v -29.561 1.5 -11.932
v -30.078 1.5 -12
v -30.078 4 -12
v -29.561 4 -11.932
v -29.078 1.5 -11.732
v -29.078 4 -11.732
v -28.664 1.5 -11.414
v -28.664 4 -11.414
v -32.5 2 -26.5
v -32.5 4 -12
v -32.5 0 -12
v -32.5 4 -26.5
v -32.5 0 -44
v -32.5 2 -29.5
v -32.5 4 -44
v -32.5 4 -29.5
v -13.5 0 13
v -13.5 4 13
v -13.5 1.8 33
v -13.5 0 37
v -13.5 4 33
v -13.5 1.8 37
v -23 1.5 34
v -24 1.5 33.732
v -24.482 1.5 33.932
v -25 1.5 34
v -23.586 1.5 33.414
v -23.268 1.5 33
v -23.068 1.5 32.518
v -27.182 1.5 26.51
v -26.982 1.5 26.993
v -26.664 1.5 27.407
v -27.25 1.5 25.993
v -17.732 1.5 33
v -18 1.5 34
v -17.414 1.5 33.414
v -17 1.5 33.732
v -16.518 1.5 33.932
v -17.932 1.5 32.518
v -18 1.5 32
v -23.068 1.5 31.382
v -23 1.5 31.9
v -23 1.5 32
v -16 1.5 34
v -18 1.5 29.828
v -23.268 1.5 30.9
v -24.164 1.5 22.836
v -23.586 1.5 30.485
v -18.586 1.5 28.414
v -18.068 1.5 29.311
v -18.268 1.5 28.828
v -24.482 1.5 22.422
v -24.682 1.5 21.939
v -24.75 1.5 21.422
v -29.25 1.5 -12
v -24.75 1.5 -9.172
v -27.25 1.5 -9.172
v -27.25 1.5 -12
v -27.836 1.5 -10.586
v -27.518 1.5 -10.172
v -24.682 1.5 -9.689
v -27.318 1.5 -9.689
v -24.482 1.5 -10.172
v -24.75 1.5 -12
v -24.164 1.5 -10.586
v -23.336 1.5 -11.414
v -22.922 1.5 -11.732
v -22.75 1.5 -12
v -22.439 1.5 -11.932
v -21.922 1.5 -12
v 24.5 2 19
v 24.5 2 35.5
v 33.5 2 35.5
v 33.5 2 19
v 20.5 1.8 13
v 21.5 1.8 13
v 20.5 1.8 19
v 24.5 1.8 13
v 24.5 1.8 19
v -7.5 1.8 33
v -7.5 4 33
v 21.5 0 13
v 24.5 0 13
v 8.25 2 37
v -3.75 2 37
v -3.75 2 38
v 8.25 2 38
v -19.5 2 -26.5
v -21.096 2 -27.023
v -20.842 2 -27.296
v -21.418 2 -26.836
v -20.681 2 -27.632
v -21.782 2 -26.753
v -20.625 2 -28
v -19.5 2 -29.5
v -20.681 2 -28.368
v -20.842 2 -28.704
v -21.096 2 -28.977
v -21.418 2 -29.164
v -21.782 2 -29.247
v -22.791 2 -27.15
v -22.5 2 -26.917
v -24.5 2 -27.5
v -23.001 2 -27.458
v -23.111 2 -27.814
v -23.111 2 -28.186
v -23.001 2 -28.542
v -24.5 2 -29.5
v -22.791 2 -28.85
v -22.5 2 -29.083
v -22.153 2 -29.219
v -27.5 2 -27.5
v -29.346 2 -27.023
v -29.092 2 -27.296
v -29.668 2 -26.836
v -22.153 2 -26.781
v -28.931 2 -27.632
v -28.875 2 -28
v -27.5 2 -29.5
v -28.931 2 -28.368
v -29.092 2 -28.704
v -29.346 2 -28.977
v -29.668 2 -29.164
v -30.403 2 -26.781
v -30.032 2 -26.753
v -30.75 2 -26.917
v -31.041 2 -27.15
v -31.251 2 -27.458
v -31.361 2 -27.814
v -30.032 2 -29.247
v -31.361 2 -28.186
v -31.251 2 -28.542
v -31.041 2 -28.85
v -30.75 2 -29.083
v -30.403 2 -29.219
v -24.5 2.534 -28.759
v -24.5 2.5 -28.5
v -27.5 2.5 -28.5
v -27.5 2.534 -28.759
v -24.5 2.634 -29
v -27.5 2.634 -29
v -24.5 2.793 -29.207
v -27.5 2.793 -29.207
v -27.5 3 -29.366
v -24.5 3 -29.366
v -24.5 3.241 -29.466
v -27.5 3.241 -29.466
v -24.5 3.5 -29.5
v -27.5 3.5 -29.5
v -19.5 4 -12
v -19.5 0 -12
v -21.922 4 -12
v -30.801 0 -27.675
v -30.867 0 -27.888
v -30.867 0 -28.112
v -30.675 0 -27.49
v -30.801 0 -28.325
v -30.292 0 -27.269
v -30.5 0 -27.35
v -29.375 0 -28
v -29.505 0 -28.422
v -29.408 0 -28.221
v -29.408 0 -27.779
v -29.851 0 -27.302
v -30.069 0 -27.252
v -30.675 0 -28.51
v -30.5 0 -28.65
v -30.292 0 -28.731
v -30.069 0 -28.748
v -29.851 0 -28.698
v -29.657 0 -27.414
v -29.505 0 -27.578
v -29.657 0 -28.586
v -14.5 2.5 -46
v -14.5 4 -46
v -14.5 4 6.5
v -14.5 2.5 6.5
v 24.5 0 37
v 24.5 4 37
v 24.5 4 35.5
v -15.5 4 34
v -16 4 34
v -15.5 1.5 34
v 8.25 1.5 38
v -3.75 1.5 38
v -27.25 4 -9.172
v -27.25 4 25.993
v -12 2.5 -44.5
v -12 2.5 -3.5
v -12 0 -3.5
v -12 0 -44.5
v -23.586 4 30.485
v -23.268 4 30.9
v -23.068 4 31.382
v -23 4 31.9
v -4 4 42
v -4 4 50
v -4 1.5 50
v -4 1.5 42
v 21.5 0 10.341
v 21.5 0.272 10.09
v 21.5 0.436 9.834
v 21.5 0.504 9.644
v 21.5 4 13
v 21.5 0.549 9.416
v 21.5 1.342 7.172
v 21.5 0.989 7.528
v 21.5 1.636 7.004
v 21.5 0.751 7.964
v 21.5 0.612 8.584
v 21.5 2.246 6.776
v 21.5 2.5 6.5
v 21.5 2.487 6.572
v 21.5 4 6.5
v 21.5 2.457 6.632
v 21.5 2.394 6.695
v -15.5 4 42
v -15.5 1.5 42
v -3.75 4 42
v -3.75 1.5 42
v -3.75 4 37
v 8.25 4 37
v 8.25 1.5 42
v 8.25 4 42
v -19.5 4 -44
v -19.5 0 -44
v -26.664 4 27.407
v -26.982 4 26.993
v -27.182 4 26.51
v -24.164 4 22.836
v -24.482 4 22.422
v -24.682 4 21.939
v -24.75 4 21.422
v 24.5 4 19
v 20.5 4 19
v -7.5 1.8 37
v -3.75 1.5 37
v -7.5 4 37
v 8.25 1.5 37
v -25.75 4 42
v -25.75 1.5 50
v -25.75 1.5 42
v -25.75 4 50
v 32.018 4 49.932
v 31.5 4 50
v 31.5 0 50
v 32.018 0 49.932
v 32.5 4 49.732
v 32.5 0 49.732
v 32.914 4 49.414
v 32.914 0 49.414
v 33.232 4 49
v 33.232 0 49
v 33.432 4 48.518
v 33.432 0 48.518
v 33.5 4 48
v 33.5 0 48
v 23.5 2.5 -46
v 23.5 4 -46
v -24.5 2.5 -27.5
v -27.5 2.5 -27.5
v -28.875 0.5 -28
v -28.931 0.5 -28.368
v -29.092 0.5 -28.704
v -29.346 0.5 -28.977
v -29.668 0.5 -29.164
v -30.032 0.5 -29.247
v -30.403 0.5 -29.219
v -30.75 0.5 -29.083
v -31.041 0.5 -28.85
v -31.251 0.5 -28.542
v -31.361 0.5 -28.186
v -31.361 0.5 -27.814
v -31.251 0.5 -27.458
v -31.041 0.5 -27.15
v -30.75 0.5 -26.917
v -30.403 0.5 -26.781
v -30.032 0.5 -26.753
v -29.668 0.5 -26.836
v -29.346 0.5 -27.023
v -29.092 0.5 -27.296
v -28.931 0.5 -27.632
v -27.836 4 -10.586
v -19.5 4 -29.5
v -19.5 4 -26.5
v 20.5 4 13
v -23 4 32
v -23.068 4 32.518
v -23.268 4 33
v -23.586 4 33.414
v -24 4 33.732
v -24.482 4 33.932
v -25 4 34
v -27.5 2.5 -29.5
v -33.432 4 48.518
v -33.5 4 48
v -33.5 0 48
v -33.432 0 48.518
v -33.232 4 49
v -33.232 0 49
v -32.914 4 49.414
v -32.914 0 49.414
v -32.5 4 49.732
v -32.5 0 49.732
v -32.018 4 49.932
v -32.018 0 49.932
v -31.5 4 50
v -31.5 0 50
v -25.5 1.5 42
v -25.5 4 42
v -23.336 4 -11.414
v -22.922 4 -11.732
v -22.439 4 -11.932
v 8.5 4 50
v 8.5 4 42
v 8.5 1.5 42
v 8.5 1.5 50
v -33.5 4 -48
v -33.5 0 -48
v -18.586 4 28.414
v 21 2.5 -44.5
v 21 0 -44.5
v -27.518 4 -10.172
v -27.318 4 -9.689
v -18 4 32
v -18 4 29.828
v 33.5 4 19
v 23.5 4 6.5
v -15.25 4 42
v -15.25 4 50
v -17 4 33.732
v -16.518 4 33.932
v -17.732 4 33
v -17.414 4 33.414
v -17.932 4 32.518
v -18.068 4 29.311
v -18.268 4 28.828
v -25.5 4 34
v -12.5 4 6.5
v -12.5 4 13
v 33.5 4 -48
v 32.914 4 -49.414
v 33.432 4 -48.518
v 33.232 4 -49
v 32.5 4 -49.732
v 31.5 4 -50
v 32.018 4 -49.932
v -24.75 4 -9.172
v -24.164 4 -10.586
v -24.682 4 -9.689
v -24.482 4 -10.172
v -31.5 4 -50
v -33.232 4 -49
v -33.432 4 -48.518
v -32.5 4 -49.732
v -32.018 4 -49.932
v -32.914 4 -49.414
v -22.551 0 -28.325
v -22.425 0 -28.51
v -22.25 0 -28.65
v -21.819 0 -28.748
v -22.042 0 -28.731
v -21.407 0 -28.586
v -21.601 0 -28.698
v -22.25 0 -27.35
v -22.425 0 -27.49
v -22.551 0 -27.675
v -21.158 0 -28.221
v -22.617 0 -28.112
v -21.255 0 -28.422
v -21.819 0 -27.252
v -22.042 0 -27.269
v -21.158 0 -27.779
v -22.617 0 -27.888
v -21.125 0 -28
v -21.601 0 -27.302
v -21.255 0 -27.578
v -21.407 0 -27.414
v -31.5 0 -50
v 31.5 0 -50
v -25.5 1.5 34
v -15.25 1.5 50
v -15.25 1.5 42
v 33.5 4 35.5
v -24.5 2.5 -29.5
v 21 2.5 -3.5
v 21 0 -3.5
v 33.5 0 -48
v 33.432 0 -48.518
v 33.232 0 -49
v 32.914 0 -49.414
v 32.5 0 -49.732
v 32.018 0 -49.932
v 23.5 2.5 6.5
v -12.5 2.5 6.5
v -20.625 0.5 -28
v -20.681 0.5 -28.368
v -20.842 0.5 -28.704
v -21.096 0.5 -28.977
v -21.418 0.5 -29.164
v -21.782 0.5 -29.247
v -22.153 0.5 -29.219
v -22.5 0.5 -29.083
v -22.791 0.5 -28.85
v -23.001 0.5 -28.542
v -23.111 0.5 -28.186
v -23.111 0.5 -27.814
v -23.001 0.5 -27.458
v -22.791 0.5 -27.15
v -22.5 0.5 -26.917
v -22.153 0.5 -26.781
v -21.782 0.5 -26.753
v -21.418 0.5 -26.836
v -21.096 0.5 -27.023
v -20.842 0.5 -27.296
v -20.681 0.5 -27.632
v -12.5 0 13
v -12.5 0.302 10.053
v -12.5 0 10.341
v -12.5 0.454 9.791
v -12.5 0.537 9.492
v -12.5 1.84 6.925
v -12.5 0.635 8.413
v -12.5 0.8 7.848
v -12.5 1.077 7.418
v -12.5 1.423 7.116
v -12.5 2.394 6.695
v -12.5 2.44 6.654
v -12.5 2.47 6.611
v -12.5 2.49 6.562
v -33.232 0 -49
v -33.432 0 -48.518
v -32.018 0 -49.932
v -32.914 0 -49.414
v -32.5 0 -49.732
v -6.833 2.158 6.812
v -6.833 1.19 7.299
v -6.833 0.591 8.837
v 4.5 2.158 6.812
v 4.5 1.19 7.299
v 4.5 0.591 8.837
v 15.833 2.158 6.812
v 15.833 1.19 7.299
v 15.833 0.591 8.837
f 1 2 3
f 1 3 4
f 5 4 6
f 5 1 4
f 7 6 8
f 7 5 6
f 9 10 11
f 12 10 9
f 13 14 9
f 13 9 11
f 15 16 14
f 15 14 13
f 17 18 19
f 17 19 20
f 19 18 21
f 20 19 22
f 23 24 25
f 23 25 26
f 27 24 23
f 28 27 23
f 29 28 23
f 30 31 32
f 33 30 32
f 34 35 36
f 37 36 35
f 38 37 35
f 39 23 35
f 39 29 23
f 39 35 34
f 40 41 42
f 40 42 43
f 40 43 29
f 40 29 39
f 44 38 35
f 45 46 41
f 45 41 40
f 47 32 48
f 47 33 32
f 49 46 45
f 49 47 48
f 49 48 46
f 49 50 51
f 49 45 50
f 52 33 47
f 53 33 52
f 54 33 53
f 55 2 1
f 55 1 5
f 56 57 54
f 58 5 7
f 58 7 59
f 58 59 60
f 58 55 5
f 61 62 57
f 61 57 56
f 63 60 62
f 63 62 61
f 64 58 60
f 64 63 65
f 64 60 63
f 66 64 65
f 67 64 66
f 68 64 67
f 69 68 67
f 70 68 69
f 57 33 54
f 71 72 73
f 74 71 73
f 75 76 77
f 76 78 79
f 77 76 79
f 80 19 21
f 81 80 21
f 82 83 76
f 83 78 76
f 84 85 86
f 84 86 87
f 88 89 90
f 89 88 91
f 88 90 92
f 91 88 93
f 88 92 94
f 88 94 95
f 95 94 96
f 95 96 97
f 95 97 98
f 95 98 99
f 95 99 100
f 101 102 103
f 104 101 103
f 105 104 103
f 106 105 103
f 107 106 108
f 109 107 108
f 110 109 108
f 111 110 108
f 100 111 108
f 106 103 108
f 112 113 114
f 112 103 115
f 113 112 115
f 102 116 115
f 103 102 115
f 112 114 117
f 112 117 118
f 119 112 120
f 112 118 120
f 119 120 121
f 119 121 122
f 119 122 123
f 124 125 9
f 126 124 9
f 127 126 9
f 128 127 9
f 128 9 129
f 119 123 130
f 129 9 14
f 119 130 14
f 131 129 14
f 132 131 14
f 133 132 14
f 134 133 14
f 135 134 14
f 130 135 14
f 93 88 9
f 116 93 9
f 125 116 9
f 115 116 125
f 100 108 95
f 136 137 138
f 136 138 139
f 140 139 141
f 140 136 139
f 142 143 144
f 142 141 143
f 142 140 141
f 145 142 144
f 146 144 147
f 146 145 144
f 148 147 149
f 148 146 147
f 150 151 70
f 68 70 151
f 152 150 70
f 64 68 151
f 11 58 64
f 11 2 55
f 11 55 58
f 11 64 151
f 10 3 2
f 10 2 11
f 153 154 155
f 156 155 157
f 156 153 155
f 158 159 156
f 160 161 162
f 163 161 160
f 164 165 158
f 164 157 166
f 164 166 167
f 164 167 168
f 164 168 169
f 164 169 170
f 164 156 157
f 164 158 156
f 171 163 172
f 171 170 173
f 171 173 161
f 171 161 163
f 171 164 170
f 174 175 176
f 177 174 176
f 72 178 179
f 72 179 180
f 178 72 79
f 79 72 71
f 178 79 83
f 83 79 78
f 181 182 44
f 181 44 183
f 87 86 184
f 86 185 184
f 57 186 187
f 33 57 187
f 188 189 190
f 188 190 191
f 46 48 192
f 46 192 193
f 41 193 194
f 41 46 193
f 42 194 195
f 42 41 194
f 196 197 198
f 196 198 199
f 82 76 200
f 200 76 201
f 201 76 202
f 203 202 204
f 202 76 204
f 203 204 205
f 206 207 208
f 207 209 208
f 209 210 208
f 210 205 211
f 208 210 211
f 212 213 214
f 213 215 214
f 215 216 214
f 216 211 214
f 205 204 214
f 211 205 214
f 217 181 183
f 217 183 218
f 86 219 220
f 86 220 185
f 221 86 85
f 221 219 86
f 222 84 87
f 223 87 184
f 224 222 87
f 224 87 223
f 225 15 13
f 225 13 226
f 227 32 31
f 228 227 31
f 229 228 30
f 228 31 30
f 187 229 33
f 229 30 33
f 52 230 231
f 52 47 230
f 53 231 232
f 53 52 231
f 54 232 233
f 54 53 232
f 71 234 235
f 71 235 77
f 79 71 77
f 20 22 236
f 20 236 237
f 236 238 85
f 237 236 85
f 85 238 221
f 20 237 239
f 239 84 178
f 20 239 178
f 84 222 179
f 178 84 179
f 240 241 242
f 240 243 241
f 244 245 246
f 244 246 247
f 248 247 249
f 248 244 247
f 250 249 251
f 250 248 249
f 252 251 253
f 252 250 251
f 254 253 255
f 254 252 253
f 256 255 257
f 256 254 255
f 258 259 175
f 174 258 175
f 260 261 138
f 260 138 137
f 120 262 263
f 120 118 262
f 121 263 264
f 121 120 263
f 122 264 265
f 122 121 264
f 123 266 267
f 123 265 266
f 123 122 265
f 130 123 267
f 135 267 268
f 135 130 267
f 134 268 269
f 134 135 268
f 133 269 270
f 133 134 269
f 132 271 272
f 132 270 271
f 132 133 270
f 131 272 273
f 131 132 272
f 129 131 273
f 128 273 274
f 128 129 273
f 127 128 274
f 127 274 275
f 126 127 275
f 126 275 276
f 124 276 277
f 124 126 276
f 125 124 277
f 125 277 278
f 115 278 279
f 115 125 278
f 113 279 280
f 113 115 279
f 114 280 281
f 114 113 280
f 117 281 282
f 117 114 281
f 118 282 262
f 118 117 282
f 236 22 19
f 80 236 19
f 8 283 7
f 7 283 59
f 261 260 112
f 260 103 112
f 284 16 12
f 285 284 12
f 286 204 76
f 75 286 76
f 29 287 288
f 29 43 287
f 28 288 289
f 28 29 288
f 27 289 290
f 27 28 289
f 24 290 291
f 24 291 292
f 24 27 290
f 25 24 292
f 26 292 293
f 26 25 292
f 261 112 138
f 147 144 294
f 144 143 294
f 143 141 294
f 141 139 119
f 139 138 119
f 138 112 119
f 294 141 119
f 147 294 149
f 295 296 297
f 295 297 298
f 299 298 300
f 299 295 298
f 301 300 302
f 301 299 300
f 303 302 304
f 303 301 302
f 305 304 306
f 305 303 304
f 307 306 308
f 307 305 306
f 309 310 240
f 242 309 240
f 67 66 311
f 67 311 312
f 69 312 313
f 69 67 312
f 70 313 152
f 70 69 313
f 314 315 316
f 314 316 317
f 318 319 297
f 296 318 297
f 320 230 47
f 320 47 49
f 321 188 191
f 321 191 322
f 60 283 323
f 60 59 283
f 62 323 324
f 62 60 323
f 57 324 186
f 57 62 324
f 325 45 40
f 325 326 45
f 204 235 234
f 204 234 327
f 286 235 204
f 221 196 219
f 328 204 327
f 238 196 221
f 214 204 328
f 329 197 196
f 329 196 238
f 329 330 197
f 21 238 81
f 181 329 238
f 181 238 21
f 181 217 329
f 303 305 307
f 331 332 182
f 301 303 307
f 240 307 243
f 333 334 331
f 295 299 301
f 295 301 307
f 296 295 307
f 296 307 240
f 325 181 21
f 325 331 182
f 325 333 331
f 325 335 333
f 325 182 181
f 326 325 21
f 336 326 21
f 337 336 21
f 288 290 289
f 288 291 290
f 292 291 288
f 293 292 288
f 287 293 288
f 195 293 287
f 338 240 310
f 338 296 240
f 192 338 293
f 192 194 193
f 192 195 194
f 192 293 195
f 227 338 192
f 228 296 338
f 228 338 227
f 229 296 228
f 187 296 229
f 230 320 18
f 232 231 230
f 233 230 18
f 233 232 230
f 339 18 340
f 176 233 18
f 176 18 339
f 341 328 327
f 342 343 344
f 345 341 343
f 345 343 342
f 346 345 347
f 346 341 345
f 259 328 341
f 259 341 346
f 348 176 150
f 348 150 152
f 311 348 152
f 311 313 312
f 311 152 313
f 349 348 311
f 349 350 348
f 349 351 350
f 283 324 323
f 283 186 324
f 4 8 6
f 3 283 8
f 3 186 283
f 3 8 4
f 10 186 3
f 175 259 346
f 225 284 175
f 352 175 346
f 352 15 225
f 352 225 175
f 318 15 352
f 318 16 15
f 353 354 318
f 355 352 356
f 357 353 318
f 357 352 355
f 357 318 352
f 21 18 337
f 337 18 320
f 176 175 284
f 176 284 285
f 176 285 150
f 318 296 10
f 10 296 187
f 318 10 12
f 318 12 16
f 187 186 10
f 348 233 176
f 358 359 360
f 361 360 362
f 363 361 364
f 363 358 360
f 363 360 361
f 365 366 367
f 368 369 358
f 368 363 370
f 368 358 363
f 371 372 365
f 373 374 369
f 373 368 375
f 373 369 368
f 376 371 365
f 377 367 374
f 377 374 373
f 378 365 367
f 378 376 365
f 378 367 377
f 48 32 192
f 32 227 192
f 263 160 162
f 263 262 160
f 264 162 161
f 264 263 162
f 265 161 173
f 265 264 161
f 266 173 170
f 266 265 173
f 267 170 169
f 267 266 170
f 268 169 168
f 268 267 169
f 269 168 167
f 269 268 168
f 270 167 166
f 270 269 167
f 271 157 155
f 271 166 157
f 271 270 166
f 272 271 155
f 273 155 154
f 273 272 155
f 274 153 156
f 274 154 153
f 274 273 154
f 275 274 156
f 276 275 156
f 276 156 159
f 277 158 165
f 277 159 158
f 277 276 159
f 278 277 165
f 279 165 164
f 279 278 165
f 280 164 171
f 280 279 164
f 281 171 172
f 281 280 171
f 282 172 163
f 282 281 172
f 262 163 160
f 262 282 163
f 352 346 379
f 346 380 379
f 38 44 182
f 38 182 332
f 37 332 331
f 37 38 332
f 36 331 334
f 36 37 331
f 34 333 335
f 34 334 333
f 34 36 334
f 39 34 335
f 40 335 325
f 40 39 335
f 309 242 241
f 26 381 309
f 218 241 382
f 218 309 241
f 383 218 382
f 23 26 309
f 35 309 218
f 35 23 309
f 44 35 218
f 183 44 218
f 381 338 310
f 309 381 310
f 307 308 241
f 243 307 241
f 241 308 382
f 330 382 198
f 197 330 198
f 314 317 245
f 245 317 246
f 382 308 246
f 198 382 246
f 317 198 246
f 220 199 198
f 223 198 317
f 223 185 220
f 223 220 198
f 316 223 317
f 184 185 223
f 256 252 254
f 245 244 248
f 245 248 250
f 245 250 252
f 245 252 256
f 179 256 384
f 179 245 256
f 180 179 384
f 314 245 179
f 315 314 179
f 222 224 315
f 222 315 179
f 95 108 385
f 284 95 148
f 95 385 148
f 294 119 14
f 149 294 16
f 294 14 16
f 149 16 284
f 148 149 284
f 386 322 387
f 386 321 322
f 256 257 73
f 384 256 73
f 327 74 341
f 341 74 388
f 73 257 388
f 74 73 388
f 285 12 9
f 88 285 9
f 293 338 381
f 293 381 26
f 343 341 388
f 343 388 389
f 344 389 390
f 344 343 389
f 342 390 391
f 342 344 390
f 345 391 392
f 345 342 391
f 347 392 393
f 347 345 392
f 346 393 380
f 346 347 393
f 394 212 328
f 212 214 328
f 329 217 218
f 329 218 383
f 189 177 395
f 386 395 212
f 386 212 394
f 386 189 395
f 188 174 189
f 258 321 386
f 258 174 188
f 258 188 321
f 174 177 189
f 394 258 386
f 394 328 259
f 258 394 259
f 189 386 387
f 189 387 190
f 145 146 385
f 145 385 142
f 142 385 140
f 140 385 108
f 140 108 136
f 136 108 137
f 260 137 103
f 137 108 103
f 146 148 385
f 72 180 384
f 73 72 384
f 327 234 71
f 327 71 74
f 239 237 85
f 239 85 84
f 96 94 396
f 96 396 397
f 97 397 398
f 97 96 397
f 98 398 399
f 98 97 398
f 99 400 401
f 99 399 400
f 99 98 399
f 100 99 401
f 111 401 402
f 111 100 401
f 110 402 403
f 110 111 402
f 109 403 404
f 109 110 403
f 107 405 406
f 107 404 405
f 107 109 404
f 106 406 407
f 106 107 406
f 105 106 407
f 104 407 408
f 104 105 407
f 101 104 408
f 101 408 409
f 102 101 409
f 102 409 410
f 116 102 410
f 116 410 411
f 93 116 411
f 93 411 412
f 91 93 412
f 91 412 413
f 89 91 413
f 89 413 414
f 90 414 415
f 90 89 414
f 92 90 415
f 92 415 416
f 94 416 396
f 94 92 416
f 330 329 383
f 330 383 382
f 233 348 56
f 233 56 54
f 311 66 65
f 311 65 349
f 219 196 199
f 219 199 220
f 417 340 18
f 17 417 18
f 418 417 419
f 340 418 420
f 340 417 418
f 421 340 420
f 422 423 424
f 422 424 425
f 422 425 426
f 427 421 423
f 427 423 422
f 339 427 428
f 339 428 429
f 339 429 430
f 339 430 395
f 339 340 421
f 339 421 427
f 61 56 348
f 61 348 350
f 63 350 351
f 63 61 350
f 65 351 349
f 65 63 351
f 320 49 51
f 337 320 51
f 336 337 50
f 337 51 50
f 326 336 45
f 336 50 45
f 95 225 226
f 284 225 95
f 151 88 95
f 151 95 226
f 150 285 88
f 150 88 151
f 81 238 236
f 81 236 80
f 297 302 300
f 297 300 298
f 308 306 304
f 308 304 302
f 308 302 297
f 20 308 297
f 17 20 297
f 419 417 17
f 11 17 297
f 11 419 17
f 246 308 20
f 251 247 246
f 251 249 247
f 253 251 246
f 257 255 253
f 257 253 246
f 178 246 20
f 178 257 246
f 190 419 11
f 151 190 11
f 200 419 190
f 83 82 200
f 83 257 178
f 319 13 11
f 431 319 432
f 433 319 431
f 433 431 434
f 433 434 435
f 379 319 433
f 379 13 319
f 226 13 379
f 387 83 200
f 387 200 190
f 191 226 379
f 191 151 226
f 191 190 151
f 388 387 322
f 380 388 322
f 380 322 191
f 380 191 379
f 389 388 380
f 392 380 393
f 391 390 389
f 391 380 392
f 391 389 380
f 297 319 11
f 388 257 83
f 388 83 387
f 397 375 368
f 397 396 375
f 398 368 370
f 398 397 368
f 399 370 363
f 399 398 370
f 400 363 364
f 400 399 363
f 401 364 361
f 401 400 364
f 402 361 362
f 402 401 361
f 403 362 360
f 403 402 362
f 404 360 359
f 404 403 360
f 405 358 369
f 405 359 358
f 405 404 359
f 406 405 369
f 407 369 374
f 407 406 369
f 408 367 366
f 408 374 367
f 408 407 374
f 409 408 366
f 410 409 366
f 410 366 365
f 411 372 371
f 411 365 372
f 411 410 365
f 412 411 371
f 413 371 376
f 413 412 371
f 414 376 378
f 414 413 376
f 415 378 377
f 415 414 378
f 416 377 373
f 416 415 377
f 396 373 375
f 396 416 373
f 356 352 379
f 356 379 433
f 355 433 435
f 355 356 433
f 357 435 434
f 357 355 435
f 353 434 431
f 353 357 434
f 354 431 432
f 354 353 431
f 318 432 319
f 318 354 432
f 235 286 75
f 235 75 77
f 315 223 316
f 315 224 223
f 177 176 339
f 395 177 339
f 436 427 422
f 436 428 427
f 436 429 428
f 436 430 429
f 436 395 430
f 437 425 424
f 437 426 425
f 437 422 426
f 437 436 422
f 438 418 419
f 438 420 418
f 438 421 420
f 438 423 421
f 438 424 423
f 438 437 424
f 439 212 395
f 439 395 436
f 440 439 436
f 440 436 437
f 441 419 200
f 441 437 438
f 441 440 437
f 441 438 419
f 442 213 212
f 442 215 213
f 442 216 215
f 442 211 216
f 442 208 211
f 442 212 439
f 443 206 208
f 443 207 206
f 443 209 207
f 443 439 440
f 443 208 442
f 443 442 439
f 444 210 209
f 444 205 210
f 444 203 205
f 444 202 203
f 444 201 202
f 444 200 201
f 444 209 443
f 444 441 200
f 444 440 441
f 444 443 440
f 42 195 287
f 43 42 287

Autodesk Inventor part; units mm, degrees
ref_plane "YZ Plane" through (0, 0, 0) normal (1, 0, 0) x (0, 1, 0)
ref_plane "XZ Plane" through (0, 0, 0) normal (0, 1, 0) x (-1, 0, 0)
ref_plane "XY Plane" through (0, 0, 0) normal (0, 0, 1) x (1, 0, 0)
sketch "Sketch2" plane through (0, 0, 0) normal (0, 1, 0) x (-1, 0, 0)
  line L0 (-33.5, -50) -> (33.5, -50)
  line L1 (33.5, -50) -> (33.5, 50)
  line L2 (33.5, 50) -> (-33.5, 50)
  line L3 (-33.5, 50) -> (-33.5, -50)
  line L4 (-33.5, -50) -> (33.5, 50) construction
  line L5 (33.5, -50) -> (-33.5, 50) construction
  point P0 (0, 0)
  dimension "d0" = 67
  dimension "d1" = 100
extrude "Extrusion1" add sketch "Sketch2" along normal blind 4
sketch "Sketch3" plane through (0, 4, 0) normal (0, 1, 0) x (1, 0, 0)
  line L0 (33.5, 50) -> (-33.5, 50) projected
  line L1 (-14.5, -6.5) -> (23.5, -6.5)
  line L2 (23.5, -6.5) -> (23.5, 46)
  line L3 (23.5, 46) -> (-14.5, 46)
  line L4 (-14.5, 46) -> (-14.5, -6.5)
  line L5 (-14.5, -6.5) -> (23.5, 46) construction
  line L6 (23.5, -6.5) -> (-14.5, 46) construction
  line L7 (33.5, -50) -> (33.5, 50) projected
  point P0 (0, 0)
  point P1 (4.5, 19.75)
  dimension "d4" = 38
  dimension "d5" = 52.5
  dimension "d6" = 4
  dimension "d99" = 10
extrude "Extrusion2" cut sketch "Sketch3" against normal blind 1.5
sketch "Sketch4" plane through (0, 2.5, 0) normal (0, 1, 0) x (1, 0, 0)
  line L0 (23.5, -6.5) -> (-14.5, -6.5) projected
  line L1 (23.5, 46) -> (23.5, -6.5) projected
  line L2 (-14.5, 46) -> (23.5, 46) projected
  line L3 (-14.5, -6.5) -> (-14.5, 46) projected
  line L4 (-12, 44.5) -> (21, 44.5)
  line L5 (21, 44.5) -> (21, 3.5)
  line L6 (21, 3.5) -> (-12, 3.5)
  line L7 (-12, 3.5) -> (-12, 44.5)
  line L8 (-12, 44.5) -> (21, 3.5) construction
  line L9 (21, 44.5) -> (-12, 3.5) construction
  point P0 (0, 0)
  point P1 (4.5, 24)
  dimension "d9" = 10
  dimension "d10" = 1.5
  dimension "d11" = 2.5
  dimension "d12" = 2.5
extrude "Extrusion3" cut sketch "Sketch4" against normal blind 2.5 contours L4 L5 L6 L7
sketch "Sketch5" plane through (0, 4, 0) normal (0, 1, 0) x (1, 0, 0)
  line L0 (23.5, 46) -> (23.5, -6.5) projected
  line L1 (23.5, -6.5) -> (-14.5, -6.5) projected
  line L2 (-14.5, -6.5) -> (-14.5, 46) projected
  line L3 (-12.5, -13) -> (-12.5, -6.5)
  line L4 (21.5, -13) -> (21.5, -6.5)
  line L5 (33.5, 50) -> (-33.5, 50) projected
  line L6 (-12.5, -13) -> (21.5, -13)
  point P0 (0, 0)
  dimension "d18" = 2
  dimension "d19" = 2
  dimension "d158" = 6.5
extrude "Extrusion4" cut sketch "Sketch5" against normal blind 0.25
sketch "Sketch12" plane through (0, 4, 0) normal (0, 1, 0) x (1, 0, 0)
  line L0 (21.5, -13) -> (-12.5, -13) projected
  line L1 (-13.5, -37) -> (24.5, -37)
  line L2 (24.5, -37) -> (24.5, -13)
  line L3 (24.5, -13) -> (-13.5, -13)
  line L4 (-13.5, -13) -> (-13.5, -37)
  line L5 (-13.5, -37) -> (24.5, -13) construction
  line L6 (24.5, -37) -> (-13.5, -13) construction
  line L7 (23.5, 46) -> (23.5, -6.5) projected
  point P0 (0, 0)
  point P1 (5.5, -25)
  point P2 (5.5, -25)
  dimension "d58" = 38
  dimension "d59" = 24
  dimension "d100" = 1
extrude "Extrusion10" cut sketch "Sketch12" against normal blind 4
sketch "Sketch13" plane through (24.5, 4, 13) normal (-1, 0, 0) x (0, 0, 1)
  line L0 (0, 0) -> (24, 0) projected
  line L1 (0, 0) -> (0, -4) projected
  line L2 (24, -4) -> (0, -4) projected
  line L3 (6, 0) -> (6, -4)
  line L4 (0, -2.2) -> (6, -2.2)
  point P0 (-13, -4)
  dimension "d67" = 6
  dimension "d74" = 1.8
sketch "Sketch14" plane through (-13.5, 4, 37) normal (1, 0, 0) x (0, 0, -1)
  line L0 (0, 0) -> (24, 0) projected
  line L1 (0, 0) -> (0, -4)
  line L2 (4, -2.2) -> (4, 0)
  line L3 (24, -4) -> (0, -4) projected
  line L4 (0, -2.2) -> (4, -2.2)
  point P0 (37, -4)
  point P1 (0, -2)
  dimension "d79" = 1.8
  dimension "d180" = 4
extrude "Extrusion13" add sketch "Sketch13" along normal blind 4 contours L0 L3 L4 L1
extrude "Extrusion14" add sketch "Sketch14" along normal blind 6
sketch "Sketch16" plane through (0, 3.75, 0) normal (0, 1, 0) x (1, 0, 0)
  line L0 (-12.5, -13) -> (-12.5, -6.5) projected
  line L1 (20.5, -13) -> (-12.5, -13) projected
  line L2 (21.5, -13) -> (20.5, -13) projected
  line L3 (21.5, -6.5) -> (21.5, -13) projected
  line L4 (-12.5, -6.5) -> (21.5, -6.5) projected
  point P0 (0, 0)
extrude "Extrusion15" cut sketch "Sketch16" against normal up to next
sketch "Sketch17" plane through (21.5, 4, 6.5) normal (-1, 0, 0) x (0, 0, 1)
  line L0 (0, -1.5) -> (0, -4) projected
  line L1 (6.5, -4) -> (0, -4) projected
  line L2 (6.5, 0) -> (6.5, -2.2) projected
  line L3 (0, -1.5) -> (-1.7339, -1.5) construction
  spline S0 degree 4 poles (0, -1.5) (0.1402, -1.5095) (0.2435, -1.6356) (0.3737, -1.9813) (0.553, -2.595) (1.1197, -3.1548) (2.0475, -3.4989) (2.9931, -3.3708) (3.499, -3.5451) (3.8409, -4) knots 0 0 0 0 0 0.170303 0.299552 0.400825 0.520493 0.699331 1 1 1 1 1
  line L4 (3.4081, -3.4241) -> (4.2737, -4.5759) construction
  arc A0 (4.1216, -4.4884) -> (3.4499, -3.5946) centre (2.0035, -5.3809) ccw construction
  line L5 (0.8397, -2.9601) -> (1.8217, -3.4241) construction
  arc A1 (0.9695, -2.9668) -> (1.7341, -3.3281) centre (2.1148, -1.5326) ccw construction
  line L6 (-0.6498, -1.456) -> (0.6498, -1.544) construction
  arc A2 (0.2995, -1.6769) -> (-0.3206, -1.6349) centre (-0.0262, -1.8863) ccw construction
  line L7 (0.2788, -1.8046) -> (0.6778, -2.7982) construction
  point P0 (-6.5, -4)
  point P1 (0.2332, -1.6655)
  point P2 (0.4783, -2.3014)
  point P3 (1.3307, -3.1921)
  point P4 (2.6959, -3.4298)
  point P5 (2.8138, -1.3633)
  point P6 (0.354, -1.8963)
  point P7 (0.6678, -2.6804)
extrude "Extrusion16" add sketch "Sketch17" along normal up to next
sketch "Sketch18" plane through (0, 4, 0) normal (0, 1, 0) x (1, 0, 0)
  line L0 (-33.5, 50) -> (-33.5, -50) projected
  line L1 (-32.5, 44) -> (-19.5, 44)
  line L2 (-19.5, 44) -> (-19.5, 12)
  line L3 (-19.5, 12) -> (-32.5, 12)
  line L4 (-32.5, 12) -> (-32.5, 44)
  line L5 (33.5, 50) -> (-33.5, 50) projected
  point P0 (0, 0)
  dimension "d89" = 1
  dimension "d97" = 13
  dimension "d98" = 32
  dimension "d157" = 6
extrude "Extrusion17" cut sketch "Sketch18" against normal up to next
sketch "Sketch19" plane through (-32.5, 4, -12) normal (1, 0, 0) x (0, 0, -1)
  line L0 (0, 0) -> (0, -4) projected
  line L1 (14.5, -2) -> (17.5, -2)
  line L2 (17.5, -2) -> (17.5, 0)
  line L3 (17.5, 0) -> (14.5, 0)
  line L4 (14.5, 0) -> (14.5, -2)
  line L5 (14.5, -2) -> (17.5, 0) construction
  line L6 (17.5, -2) -> (14.5, 0) construction
  line L7 (0, 0) -> (32, 0) projected
  point P0 (16, -1)
  dimension "d106" = 3
  dimension "d107" = 2
  dimension "d108" = 16
extrude "Extrusion18" add sketch "Sketch19" along normal up to next
sketch "Sketch21" plane through (-32.5, 2, -29.5) normal (0, -1, 0) x (1, 0, 0)
  line L0 (5, 0) -> (8, 0)
  line L1 (8, 0) -> (8, 2)
  line L2 (8, 2) -> (5, 2)
  line L3 (5, 2) -> (5, 0)
  line L4 (5, 0) -> (8, 2) construction
  line L5 (8, 0) -> (5, 2) construction
  line L6 (0, 0) -> (13, 0) projected
  point P0 (-32.5, -3.5)
  point P1 (6.5, 1)
  point P2 (6.5, 1)
  point P3 (6.5, 1)
  point P4 (6.5, 0)
  dimension "d111" = 3
  dimension "d112" = 2
extrude "Extrusion19" cut sketch "Sketch21" against normal blind 0.5
fillet "Fillet6" radius 1 1 edges at (-26, 2.5, -29.5)
sketch "Sketch22" plane through (-32.5, 2, -29.5) normal (0, -1, 0) x (1, 0, 0)
  line L0 (13, 0) -> (13, 3)
  circle A0 centre (2.375, 1.5) radius 1.25
  circle A1 centre (10.625, 1.5) radius 1.25
  line L1 (0, 3) -> (13, 3) projected
  line L2 (0, 0) -> (0, 3) projected
  line L3 (0, 0) -> (5, 0) projected
  point P0 (6.5, 1.5)
  point P1 (6.5, 3)
  point P2 (13, 1.5)
  point P3 (0, 1.5)
  point P4 (6.5, 3)
  dimension "d116" = 2.5
  dimension "d117" = 2.5
  dimension "d118" = 8.25
  dimension "d119" = 4.125
extrude "Extrusion20" add sketch "Sketch22" along normal blind 2
chamfer "Chamfer3" distance 0.5 angle 45 2 edges at (-31.375, 0, -28) (-23.125, 0, -28)
sketch "Sketch23" plane through (0, 4, 0) normal (0, 1, 0) x (1, 0, 0)
  line L0 (-33.5, 50) -> (-33.5, -50) projected
  line L1 (-33.5, -50) -> (33.5, -50) projected
  line L2 (-25.75, -34) -> (-15.25, -34)
  line L3 (-15.25, -34) -> (-15.25, -50)
  line L4 (-15.25, -50) -> (-25.75, -50)
  line L5 (-25.75, -50) -> (-25.75, -34)
  line L6 (-25.75, -34) -> (-15.25, -50) construction
  line L7 (-15.25, -34) -> (-25.75, -50) construction
  line L8 (21.5, -6.5) -> (21.5, -13) projected
  line L9 (-25.5, -34) -> (-25.5, -42)
  line L10 (-25.5, -42) -> (-25.75, -42)
  line L11 (-15.5, -34) -> (-15.5, -42)
  line L12 (-15.5, -42) -> (-15.25, -42)
  point P0 (0, 0)
  point P1 (-20.5, -42)
  dimension "d125" = 10.5
  dimension "d126" = 16
  dimension "d127" = 13
  dimension "d130" = 0.25
  dimension "d131" = 0.25
  dimension "d132" = 8
extrude "Extrusion22" cut sketch "Sketch23" against normal blind 2.5 contours L5 L10 L9 L2 L11 L12 L3 L1
sketch "Sketch25" plane through (0, 4, 0) normal (0, 1, 0) x (1, 0, 0)
  line L0 (33.5, -50) -> (33.5, 50) projected
  line L1 (24.5, -19) -> (24.5, -37) projected
  line L2 (24.5, -37) -> (-7.5, -37) projected
  line L3 (24.5, -19) -> (33.5, -19)
  line L4 (24.5, -35.5) -> (33.5, -35.5)
  point P0 (0, 0)
  dimension "d150" = 1.5
extrude "Extrusion24" cut sketch "Sketch25" against normal blind 2
sketch "Sketch27" plane through (0, 4, 0) normal (0, 1, 0) x (1, 0, 0)
  line L0 (-15.25, -50) -> (33.5, -50) projected
  line L1 (24.5, -35.5) -> (24.5, -37) projected
  line L2 (-4, -42) -> (8.5, -42)
  line L3 (8.5, -42) -> (8.5, -50)
  line L4 (8.5, -50) -> (-4, -50)
  line L5 (-4, -50) -> (-4, -42)
  line L6 (-4, -42) -> (8.5, -50) construction
  line L7 (8.5, -42) -> (-4, -50) construction
  line L8 (-3.75, -37) -> (8.25, -37)
  line L9 (8.25, -37) -> (8.25, -42)
  line L10 (8.25, -42) -> (-3.75, -42)
  line L11 (-3.75, -42) -> (-3.75, -37)
  line L12 (-3.75, -37) -> (8.25, -42) construction
  line L13 (8.25, -37) -> (-3.75, -42) construction
  line L14 (24.5, -37) -> (-7.5, -37) projected
  point P0 (0, 0)
  point P1 (2.25, -46)
  point P2 (2.25, -39.5)
  point P3 (2.25, -39.5)
  point P4 (2.25, -46)
  dimension "d166" = 12.5
  dimension "d167" = 8
  dimension "d168" = 12
  dimension "d170" = 16
extrude "Extrusion26" cut sketch "Sketch27" against normal blind 2.5
sketch "Sketch29" plane through (0, 1.5, 0) normal (0, 1, 0) x (1, 0, 0)
  line L0 (-3.75, -37) -> (8.25, -37) projected
  line L1 (-3.75, -42) -> (-3.75, -37) projected
  line L2 (8.25, -37) -> (8.25, -42) projected
  line L3 (-3.75, -38) -> (8.25, -38)
  point P0 (0, 0)
  dimension "d177" = 1
extrude "Extrusion28" add sketch "Sketch29" along normal blind 0.5
sketch "Sketch30" plane through (0, 4, 0) normal (0, 1, 0) x (1, 0, 0)
  line L0 (-27.25, 12) -> (-27.25, -26.8211)
  line L1 (-27.25, -26.8211) -> (-23, -31.0711)
  line L2 (-23, -31.0711) -> (-23, -34)
  line L3 (-24.75, 12) -> (-24.75, -22.25)
  line L4 (-24.75, -22.25) -> (-18, -29)
  line L5 (-18, -29) -> (-18, -34)
  line L6 (-25.5, -34) -> (-15.5, -34) projected
  line L7 (-32.5, 12) -> (-19.5, 12) projected
  line L8 (-27.25, 12) -> (-24.75, 12)
  line L9 (-23, -34) -> (-18, -34)
  line L10 (-25.5, -34) -> (-15.5, -34) projected
  point P0 (0, 0)
  point P1 (-20.5, -34)
  point P2 (-20.5, -34)
  point P3 (-26, 12)
  point P4 (-26, 12)
  point P5 (-20.5, -34)
  point P6 (-26, 12)
  dimension "d181" = 2.5
  dimension "d182" = 5
  dimension "d183" = 45
  dimension "d184" = 45
  dimension "d185" = 2.5
  dimension "d186" = 1.25
  dimension "d188" = 5
  dimension "d189" = 5
extrude "Extrusion29" cut sketch "Sketch30" against normal blind 2.5
chamfer "Chamfer5" distance 2 angle 45 2 edges at (-27.25, 2.75, -12) (-24.75, 2.75, -12)
fillet "Fillet9" radius 2 10 edges at (-23, 2.75, 34) (-18, 2.75, 34) (-18, 2.75, 29) (-24.75, 2.75, 22.25) (-24.75, 2.75, -10) (-22.75, 2.75, -12) (-29.25, 2.75, -12) (-27.25, 2.75, -10) (-27.25, 2.75, 26.8211) (-23, 2.75, 31.0711)
fillet "Fillet10" radius 2 4 edges at (33.5, 2, 50) (-33.5, 2, 50) (33.5, 2, -50) (-33.5, 2, -50)
properties part number "DisplayTop"
